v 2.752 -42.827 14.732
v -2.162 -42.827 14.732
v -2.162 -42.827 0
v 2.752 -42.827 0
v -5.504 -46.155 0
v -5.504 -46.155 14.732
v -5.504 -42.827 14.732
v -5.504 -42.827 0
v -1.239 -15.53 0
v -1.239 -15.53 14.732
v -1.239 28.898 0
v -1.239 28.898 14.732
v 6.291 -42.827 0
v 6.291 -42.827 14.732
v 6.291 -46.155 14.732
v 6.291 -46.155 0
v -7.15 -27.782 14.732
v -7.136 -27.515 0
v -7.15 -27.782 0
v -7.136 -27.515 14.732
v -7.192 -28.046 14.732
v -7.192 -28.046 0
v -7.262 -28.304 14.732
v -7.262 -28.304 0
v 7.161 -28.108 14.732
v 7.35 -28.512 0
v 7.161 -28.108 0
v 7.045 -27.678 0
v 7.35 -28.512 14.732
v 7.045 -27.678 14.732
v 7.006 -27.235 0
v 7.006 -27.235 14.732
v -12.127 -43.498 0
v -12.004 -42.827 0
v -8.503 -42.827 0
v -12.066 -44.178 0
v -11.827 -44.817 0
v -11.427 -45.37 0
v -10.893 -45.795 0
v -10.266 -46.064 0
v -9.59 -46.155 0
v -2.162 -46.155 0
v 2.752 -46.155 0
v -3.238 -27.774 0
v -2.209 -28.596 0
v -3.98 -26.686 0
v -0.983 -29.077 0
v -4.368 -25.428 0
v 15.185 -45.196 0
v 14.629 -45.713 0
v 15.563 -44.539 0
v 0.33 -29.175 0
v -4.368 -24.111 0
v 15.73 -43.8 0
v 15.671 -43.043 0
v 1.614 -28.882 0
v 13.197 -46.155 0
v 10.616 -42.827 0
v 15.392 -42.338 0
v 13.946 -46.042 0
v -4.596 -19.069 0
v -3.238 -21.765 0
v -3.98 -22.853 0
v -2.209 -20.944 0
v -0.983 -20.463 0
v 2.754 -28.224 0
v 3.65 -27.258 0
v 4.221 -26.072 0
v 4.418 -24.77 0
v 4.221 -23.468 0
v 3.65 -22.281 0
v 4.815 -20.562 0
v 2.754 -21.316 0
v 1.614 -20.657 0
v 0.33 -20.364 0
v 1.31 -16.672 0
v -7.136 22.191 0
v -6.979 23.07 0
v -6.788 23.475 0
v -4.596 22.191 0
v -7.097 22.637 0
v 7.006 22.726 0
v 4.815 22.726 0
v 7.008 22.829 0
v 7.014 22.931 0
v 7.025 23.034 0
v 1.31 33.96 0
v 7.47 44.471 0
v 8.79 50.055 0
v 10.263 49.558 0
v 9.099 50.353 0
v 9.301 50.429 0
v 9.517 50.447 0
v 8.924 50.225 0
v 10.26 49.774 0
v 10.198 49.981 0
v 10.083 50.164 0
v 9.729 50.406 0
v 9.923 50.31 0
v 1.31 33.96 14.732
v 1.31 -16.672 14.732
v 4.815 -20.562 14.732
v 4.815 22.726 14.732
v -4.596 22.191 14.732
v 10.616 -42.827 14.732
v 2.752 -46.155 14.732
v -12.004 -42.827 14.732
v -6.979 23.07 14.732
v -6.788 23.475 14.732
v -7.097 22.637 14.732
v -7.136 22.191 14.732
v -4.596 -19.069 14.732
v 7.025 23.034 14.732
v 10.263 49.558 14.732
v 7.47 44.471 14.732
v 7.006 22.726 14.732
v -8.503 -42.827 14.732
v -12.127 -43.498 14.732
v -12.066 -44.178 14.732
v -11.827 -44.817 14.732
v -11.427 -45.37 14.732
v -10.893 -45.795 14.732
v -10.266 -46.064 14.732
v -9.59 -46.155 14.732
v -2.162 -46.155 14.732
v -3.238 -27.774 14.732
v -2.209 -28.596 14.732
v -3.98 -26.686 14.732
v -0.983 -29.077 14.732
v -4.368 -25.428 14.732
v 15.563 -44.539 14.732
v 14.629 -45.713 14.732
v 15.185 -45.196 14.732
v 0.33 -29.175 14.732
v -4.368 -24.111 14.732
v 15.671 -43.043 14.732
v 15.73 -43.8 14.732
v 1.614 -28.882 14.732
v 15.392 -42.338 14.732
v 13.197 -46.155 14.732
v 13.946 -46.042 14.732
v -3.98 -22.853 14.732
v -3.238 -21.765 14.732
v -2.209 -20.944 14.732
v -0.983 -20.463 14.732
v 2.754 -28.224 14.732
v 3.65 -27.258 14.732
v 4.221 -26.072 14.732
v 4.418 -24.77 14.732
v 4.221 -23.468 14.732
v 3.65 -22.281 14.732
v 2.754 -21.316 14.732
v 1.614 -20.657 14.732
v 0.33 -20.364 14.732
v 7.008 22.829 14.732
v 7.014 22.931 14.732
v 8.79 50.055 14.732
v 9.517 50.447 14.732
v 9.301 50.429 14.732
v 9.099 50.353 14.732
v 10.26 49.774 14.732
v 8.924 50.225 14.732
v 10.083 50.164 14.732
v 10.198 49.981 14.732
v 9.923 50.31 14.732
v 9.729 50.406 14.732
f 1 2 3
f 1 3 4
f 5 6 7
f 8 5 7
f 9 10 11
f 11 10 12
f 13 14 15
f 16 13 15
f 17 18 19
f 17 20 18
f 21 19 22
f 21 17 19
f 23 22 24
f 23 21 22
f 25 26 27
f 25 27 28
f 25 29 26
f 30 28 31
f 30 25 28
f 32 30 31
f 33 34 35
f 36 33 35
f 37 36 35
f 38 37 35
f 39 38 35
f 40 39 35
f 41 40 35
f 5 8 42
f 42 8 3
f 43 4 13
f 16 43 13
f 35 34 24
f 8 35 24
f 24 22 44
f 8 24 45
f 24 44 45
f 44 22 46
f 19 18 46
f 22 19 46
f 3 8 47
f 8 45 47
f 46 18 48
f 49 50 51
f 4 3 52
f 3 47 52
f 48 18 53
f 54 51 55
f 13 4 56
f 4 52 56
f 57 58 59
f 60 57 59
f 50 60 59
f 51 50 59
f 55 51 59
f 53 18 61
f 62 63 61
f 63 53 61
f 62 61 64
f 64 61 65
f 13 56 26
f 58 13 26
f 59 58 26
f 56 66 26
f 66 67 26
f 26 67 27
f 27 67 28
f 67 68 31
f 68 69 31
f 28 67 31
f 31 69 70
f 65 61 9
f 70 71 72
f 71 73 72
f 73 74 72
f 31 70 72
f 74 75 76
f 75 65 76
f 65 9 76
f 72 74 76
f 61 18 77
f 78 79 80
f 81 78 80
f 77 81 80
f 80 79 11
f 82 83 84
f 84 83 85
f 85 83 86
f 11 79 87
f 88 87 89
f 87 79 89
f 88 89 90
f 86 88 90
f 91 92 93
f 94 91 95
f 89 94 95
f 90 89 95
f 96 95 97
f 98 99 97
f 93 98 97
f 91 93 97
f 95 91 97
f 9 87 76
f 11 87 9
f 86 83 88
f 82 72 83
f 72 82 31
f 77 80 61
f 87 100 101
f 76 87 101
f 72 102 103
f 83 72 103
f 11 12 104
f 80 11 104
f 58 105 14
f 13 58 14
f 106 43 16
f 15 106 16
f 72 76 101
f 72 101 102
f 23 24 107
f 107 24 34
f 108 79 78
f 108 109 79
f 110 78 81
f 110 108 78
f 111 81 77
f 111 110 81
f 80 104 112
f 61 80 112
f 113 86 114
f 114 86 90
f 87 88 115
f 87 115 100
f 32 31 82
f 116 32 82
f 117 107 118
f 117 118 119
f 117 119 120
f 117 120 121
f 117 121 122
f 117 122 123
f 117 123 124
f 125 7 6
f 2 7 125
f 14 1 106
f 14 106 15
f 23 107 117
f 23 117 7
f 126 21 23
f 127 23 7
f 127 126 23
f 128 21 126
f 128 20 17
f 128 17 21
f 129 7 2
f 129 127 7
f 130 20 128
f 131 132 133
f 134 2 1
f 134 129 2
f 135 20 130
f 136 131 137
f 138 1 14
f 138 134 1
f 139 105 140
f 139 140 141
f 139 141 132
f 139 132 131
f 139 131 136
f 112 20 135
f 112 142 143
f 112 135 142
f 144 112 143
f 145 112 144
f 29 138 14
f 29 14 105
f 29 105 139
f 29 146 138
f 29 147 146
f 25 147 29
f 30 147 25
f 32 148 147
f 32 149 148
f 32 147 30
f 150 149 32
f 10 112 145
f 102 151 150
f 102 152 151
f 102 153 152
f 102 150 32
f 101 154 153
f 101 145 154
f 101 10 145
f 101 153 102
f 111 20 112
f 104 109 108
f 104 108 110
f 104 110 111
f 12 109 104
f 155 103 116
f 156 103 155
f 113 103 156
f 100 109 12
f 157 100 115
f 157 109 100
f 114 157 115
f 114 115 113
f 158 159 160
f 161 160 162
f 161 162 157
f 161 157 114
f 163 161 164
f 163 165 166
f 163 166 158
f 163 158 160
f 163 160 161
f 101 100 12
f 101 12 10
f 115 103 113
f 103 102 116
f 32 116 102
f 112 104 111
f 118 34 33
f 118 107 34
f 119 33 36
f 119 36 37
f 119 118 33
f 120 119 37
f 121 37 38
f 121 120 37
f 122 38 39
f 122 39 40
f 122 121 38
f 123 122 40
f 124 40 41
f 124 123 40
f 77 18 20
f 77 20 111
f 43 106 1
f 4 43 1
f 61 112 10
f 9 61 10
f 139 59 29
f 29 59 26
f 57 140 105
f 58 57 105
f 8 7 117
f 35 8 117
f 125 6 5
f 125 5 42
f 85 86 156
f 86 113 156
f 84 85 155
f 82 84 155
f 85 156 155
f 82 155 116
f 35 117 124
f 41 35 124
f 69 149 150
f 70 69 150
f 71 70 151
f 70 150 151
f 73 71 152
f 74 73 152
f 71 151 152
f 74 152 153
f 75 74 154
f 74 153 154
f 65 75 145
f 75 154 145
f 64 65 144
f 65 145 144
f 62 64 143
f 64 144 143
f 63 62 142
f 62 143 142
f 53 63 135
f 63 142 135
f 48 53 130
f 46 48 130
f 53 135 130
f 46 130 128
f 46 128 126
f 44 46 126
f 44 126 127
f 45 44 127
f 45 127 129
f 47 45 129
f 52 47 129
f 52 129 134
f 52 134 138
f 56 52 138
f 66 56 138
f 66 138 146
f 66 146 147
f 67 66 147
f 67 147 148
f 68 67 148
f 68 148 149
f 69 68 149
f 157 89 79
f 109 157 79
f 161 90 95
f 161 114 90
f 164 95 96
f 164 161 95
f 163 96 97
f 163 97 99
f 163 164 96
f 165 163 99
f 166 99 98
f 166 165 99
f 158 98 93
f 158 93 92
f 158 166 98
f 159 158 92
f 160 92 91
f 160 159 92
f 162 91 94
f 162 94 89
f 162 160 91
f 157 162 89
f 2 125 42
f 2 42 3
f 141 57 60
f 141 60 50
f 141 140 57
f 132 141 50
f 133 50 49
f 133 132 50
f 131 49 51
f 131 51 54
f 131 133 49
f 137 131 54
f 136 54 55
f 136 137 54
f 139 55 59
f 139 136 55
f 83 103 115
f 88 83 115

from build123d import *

# Parameters (mm, degrees)
F0_W     = 14.142123667
F0_H     = 50.8
F1_DEPTH = 14.732
F2_R     = 2.54
F3_R     = 0.79375
F4_R     = 4.4176924247
F4_W     = 4.9146201927
F4_H     = 3.3284204943
F5_DEPTH = 38.1


with BuildPart() as f1:
    # F0 (on Top) → F1 (new body)
    with BuildSketch(Plane.XY):
        Polygon((10.7273911178, 53.3604013813), (-7.1363440174, 22.8804013813), (7.0057796496, 22.8804013813), align=None)
        with Locations((-0.0652821839, -2.5195986187)):
            Rectangle(F0_W, F0_H)
        Polygon((7.0057796496, -27.9195986187), (-7.1363440174, -27.9195986187), (-13.0909229835, -46.1554975013), (17.6123739426, -46.1554975013), align=None)
    extrude(amount=F1_DEPTH)

    # F2
    f2_edges = [f1.edges().sort_by_distance(p)[0] for p in [
        (7.00578, -27.919599, 7.366),
        (7.00578, 22.880401, 7.366),
        (-13.090923, -46.155498, 7.366),
        (17.612374, -46.155498, 7.366),
        (-7.136344, 22.880401, 7.366),
        (-7.136344, -27.919599, 7.366),
    ]]
    fillet(f2_edges, radius=F2_R)

    # F3
    f3_edges = [f1.edges().sort_by_distance(p)[0] for p in [
        (10.727391, 53.360401, 7.366),
    ]]
    fillet(f3_edges, radius=F3_R)

    # F4 (on face) → F5 (cut)
    with BuildSketch(Plane.XY.offset(14.732)):
        with Locations((0, -24.7696824372)):
            Circle(F4_R)
        Polygon((-1.2388014392, 28.897959739), (-4.5963440174, 22.1909237022), (-4.5963440174, -19.0687216818), (-1.2388014392, -15.5301969498), align=None)
        Polygon((1.3100893161, 33.960372903), (1.3100893161, 28.550172903), (1.3100893161, -16.671693043), (4.8148863068, -20.562165355), (4.8148863068, 22.7259079205), (7.4699121839, 44.4705713353), align=None)
        Polygon((-8.5027228454, -42.827077007), (-9.5895539796, -46.1554975013), (-5.5043729953, -46.1554975013), (-5.5043729953, -42.827077007), align=None)
        with Locations((0.2948777983, -44.4912872541)):
            Rectangle(F4_W, F4_H)
        Polygon((6.2907133251, -42.827077007), (6.2907133251, -46.1554975013), (13.1966339, -46.1554975013), (10.6155779213, -42.827077007), align=None)
    extrude(amount=-F5_DEPTH, mode=Mode.SUBTRACT)


solid = f1.part
